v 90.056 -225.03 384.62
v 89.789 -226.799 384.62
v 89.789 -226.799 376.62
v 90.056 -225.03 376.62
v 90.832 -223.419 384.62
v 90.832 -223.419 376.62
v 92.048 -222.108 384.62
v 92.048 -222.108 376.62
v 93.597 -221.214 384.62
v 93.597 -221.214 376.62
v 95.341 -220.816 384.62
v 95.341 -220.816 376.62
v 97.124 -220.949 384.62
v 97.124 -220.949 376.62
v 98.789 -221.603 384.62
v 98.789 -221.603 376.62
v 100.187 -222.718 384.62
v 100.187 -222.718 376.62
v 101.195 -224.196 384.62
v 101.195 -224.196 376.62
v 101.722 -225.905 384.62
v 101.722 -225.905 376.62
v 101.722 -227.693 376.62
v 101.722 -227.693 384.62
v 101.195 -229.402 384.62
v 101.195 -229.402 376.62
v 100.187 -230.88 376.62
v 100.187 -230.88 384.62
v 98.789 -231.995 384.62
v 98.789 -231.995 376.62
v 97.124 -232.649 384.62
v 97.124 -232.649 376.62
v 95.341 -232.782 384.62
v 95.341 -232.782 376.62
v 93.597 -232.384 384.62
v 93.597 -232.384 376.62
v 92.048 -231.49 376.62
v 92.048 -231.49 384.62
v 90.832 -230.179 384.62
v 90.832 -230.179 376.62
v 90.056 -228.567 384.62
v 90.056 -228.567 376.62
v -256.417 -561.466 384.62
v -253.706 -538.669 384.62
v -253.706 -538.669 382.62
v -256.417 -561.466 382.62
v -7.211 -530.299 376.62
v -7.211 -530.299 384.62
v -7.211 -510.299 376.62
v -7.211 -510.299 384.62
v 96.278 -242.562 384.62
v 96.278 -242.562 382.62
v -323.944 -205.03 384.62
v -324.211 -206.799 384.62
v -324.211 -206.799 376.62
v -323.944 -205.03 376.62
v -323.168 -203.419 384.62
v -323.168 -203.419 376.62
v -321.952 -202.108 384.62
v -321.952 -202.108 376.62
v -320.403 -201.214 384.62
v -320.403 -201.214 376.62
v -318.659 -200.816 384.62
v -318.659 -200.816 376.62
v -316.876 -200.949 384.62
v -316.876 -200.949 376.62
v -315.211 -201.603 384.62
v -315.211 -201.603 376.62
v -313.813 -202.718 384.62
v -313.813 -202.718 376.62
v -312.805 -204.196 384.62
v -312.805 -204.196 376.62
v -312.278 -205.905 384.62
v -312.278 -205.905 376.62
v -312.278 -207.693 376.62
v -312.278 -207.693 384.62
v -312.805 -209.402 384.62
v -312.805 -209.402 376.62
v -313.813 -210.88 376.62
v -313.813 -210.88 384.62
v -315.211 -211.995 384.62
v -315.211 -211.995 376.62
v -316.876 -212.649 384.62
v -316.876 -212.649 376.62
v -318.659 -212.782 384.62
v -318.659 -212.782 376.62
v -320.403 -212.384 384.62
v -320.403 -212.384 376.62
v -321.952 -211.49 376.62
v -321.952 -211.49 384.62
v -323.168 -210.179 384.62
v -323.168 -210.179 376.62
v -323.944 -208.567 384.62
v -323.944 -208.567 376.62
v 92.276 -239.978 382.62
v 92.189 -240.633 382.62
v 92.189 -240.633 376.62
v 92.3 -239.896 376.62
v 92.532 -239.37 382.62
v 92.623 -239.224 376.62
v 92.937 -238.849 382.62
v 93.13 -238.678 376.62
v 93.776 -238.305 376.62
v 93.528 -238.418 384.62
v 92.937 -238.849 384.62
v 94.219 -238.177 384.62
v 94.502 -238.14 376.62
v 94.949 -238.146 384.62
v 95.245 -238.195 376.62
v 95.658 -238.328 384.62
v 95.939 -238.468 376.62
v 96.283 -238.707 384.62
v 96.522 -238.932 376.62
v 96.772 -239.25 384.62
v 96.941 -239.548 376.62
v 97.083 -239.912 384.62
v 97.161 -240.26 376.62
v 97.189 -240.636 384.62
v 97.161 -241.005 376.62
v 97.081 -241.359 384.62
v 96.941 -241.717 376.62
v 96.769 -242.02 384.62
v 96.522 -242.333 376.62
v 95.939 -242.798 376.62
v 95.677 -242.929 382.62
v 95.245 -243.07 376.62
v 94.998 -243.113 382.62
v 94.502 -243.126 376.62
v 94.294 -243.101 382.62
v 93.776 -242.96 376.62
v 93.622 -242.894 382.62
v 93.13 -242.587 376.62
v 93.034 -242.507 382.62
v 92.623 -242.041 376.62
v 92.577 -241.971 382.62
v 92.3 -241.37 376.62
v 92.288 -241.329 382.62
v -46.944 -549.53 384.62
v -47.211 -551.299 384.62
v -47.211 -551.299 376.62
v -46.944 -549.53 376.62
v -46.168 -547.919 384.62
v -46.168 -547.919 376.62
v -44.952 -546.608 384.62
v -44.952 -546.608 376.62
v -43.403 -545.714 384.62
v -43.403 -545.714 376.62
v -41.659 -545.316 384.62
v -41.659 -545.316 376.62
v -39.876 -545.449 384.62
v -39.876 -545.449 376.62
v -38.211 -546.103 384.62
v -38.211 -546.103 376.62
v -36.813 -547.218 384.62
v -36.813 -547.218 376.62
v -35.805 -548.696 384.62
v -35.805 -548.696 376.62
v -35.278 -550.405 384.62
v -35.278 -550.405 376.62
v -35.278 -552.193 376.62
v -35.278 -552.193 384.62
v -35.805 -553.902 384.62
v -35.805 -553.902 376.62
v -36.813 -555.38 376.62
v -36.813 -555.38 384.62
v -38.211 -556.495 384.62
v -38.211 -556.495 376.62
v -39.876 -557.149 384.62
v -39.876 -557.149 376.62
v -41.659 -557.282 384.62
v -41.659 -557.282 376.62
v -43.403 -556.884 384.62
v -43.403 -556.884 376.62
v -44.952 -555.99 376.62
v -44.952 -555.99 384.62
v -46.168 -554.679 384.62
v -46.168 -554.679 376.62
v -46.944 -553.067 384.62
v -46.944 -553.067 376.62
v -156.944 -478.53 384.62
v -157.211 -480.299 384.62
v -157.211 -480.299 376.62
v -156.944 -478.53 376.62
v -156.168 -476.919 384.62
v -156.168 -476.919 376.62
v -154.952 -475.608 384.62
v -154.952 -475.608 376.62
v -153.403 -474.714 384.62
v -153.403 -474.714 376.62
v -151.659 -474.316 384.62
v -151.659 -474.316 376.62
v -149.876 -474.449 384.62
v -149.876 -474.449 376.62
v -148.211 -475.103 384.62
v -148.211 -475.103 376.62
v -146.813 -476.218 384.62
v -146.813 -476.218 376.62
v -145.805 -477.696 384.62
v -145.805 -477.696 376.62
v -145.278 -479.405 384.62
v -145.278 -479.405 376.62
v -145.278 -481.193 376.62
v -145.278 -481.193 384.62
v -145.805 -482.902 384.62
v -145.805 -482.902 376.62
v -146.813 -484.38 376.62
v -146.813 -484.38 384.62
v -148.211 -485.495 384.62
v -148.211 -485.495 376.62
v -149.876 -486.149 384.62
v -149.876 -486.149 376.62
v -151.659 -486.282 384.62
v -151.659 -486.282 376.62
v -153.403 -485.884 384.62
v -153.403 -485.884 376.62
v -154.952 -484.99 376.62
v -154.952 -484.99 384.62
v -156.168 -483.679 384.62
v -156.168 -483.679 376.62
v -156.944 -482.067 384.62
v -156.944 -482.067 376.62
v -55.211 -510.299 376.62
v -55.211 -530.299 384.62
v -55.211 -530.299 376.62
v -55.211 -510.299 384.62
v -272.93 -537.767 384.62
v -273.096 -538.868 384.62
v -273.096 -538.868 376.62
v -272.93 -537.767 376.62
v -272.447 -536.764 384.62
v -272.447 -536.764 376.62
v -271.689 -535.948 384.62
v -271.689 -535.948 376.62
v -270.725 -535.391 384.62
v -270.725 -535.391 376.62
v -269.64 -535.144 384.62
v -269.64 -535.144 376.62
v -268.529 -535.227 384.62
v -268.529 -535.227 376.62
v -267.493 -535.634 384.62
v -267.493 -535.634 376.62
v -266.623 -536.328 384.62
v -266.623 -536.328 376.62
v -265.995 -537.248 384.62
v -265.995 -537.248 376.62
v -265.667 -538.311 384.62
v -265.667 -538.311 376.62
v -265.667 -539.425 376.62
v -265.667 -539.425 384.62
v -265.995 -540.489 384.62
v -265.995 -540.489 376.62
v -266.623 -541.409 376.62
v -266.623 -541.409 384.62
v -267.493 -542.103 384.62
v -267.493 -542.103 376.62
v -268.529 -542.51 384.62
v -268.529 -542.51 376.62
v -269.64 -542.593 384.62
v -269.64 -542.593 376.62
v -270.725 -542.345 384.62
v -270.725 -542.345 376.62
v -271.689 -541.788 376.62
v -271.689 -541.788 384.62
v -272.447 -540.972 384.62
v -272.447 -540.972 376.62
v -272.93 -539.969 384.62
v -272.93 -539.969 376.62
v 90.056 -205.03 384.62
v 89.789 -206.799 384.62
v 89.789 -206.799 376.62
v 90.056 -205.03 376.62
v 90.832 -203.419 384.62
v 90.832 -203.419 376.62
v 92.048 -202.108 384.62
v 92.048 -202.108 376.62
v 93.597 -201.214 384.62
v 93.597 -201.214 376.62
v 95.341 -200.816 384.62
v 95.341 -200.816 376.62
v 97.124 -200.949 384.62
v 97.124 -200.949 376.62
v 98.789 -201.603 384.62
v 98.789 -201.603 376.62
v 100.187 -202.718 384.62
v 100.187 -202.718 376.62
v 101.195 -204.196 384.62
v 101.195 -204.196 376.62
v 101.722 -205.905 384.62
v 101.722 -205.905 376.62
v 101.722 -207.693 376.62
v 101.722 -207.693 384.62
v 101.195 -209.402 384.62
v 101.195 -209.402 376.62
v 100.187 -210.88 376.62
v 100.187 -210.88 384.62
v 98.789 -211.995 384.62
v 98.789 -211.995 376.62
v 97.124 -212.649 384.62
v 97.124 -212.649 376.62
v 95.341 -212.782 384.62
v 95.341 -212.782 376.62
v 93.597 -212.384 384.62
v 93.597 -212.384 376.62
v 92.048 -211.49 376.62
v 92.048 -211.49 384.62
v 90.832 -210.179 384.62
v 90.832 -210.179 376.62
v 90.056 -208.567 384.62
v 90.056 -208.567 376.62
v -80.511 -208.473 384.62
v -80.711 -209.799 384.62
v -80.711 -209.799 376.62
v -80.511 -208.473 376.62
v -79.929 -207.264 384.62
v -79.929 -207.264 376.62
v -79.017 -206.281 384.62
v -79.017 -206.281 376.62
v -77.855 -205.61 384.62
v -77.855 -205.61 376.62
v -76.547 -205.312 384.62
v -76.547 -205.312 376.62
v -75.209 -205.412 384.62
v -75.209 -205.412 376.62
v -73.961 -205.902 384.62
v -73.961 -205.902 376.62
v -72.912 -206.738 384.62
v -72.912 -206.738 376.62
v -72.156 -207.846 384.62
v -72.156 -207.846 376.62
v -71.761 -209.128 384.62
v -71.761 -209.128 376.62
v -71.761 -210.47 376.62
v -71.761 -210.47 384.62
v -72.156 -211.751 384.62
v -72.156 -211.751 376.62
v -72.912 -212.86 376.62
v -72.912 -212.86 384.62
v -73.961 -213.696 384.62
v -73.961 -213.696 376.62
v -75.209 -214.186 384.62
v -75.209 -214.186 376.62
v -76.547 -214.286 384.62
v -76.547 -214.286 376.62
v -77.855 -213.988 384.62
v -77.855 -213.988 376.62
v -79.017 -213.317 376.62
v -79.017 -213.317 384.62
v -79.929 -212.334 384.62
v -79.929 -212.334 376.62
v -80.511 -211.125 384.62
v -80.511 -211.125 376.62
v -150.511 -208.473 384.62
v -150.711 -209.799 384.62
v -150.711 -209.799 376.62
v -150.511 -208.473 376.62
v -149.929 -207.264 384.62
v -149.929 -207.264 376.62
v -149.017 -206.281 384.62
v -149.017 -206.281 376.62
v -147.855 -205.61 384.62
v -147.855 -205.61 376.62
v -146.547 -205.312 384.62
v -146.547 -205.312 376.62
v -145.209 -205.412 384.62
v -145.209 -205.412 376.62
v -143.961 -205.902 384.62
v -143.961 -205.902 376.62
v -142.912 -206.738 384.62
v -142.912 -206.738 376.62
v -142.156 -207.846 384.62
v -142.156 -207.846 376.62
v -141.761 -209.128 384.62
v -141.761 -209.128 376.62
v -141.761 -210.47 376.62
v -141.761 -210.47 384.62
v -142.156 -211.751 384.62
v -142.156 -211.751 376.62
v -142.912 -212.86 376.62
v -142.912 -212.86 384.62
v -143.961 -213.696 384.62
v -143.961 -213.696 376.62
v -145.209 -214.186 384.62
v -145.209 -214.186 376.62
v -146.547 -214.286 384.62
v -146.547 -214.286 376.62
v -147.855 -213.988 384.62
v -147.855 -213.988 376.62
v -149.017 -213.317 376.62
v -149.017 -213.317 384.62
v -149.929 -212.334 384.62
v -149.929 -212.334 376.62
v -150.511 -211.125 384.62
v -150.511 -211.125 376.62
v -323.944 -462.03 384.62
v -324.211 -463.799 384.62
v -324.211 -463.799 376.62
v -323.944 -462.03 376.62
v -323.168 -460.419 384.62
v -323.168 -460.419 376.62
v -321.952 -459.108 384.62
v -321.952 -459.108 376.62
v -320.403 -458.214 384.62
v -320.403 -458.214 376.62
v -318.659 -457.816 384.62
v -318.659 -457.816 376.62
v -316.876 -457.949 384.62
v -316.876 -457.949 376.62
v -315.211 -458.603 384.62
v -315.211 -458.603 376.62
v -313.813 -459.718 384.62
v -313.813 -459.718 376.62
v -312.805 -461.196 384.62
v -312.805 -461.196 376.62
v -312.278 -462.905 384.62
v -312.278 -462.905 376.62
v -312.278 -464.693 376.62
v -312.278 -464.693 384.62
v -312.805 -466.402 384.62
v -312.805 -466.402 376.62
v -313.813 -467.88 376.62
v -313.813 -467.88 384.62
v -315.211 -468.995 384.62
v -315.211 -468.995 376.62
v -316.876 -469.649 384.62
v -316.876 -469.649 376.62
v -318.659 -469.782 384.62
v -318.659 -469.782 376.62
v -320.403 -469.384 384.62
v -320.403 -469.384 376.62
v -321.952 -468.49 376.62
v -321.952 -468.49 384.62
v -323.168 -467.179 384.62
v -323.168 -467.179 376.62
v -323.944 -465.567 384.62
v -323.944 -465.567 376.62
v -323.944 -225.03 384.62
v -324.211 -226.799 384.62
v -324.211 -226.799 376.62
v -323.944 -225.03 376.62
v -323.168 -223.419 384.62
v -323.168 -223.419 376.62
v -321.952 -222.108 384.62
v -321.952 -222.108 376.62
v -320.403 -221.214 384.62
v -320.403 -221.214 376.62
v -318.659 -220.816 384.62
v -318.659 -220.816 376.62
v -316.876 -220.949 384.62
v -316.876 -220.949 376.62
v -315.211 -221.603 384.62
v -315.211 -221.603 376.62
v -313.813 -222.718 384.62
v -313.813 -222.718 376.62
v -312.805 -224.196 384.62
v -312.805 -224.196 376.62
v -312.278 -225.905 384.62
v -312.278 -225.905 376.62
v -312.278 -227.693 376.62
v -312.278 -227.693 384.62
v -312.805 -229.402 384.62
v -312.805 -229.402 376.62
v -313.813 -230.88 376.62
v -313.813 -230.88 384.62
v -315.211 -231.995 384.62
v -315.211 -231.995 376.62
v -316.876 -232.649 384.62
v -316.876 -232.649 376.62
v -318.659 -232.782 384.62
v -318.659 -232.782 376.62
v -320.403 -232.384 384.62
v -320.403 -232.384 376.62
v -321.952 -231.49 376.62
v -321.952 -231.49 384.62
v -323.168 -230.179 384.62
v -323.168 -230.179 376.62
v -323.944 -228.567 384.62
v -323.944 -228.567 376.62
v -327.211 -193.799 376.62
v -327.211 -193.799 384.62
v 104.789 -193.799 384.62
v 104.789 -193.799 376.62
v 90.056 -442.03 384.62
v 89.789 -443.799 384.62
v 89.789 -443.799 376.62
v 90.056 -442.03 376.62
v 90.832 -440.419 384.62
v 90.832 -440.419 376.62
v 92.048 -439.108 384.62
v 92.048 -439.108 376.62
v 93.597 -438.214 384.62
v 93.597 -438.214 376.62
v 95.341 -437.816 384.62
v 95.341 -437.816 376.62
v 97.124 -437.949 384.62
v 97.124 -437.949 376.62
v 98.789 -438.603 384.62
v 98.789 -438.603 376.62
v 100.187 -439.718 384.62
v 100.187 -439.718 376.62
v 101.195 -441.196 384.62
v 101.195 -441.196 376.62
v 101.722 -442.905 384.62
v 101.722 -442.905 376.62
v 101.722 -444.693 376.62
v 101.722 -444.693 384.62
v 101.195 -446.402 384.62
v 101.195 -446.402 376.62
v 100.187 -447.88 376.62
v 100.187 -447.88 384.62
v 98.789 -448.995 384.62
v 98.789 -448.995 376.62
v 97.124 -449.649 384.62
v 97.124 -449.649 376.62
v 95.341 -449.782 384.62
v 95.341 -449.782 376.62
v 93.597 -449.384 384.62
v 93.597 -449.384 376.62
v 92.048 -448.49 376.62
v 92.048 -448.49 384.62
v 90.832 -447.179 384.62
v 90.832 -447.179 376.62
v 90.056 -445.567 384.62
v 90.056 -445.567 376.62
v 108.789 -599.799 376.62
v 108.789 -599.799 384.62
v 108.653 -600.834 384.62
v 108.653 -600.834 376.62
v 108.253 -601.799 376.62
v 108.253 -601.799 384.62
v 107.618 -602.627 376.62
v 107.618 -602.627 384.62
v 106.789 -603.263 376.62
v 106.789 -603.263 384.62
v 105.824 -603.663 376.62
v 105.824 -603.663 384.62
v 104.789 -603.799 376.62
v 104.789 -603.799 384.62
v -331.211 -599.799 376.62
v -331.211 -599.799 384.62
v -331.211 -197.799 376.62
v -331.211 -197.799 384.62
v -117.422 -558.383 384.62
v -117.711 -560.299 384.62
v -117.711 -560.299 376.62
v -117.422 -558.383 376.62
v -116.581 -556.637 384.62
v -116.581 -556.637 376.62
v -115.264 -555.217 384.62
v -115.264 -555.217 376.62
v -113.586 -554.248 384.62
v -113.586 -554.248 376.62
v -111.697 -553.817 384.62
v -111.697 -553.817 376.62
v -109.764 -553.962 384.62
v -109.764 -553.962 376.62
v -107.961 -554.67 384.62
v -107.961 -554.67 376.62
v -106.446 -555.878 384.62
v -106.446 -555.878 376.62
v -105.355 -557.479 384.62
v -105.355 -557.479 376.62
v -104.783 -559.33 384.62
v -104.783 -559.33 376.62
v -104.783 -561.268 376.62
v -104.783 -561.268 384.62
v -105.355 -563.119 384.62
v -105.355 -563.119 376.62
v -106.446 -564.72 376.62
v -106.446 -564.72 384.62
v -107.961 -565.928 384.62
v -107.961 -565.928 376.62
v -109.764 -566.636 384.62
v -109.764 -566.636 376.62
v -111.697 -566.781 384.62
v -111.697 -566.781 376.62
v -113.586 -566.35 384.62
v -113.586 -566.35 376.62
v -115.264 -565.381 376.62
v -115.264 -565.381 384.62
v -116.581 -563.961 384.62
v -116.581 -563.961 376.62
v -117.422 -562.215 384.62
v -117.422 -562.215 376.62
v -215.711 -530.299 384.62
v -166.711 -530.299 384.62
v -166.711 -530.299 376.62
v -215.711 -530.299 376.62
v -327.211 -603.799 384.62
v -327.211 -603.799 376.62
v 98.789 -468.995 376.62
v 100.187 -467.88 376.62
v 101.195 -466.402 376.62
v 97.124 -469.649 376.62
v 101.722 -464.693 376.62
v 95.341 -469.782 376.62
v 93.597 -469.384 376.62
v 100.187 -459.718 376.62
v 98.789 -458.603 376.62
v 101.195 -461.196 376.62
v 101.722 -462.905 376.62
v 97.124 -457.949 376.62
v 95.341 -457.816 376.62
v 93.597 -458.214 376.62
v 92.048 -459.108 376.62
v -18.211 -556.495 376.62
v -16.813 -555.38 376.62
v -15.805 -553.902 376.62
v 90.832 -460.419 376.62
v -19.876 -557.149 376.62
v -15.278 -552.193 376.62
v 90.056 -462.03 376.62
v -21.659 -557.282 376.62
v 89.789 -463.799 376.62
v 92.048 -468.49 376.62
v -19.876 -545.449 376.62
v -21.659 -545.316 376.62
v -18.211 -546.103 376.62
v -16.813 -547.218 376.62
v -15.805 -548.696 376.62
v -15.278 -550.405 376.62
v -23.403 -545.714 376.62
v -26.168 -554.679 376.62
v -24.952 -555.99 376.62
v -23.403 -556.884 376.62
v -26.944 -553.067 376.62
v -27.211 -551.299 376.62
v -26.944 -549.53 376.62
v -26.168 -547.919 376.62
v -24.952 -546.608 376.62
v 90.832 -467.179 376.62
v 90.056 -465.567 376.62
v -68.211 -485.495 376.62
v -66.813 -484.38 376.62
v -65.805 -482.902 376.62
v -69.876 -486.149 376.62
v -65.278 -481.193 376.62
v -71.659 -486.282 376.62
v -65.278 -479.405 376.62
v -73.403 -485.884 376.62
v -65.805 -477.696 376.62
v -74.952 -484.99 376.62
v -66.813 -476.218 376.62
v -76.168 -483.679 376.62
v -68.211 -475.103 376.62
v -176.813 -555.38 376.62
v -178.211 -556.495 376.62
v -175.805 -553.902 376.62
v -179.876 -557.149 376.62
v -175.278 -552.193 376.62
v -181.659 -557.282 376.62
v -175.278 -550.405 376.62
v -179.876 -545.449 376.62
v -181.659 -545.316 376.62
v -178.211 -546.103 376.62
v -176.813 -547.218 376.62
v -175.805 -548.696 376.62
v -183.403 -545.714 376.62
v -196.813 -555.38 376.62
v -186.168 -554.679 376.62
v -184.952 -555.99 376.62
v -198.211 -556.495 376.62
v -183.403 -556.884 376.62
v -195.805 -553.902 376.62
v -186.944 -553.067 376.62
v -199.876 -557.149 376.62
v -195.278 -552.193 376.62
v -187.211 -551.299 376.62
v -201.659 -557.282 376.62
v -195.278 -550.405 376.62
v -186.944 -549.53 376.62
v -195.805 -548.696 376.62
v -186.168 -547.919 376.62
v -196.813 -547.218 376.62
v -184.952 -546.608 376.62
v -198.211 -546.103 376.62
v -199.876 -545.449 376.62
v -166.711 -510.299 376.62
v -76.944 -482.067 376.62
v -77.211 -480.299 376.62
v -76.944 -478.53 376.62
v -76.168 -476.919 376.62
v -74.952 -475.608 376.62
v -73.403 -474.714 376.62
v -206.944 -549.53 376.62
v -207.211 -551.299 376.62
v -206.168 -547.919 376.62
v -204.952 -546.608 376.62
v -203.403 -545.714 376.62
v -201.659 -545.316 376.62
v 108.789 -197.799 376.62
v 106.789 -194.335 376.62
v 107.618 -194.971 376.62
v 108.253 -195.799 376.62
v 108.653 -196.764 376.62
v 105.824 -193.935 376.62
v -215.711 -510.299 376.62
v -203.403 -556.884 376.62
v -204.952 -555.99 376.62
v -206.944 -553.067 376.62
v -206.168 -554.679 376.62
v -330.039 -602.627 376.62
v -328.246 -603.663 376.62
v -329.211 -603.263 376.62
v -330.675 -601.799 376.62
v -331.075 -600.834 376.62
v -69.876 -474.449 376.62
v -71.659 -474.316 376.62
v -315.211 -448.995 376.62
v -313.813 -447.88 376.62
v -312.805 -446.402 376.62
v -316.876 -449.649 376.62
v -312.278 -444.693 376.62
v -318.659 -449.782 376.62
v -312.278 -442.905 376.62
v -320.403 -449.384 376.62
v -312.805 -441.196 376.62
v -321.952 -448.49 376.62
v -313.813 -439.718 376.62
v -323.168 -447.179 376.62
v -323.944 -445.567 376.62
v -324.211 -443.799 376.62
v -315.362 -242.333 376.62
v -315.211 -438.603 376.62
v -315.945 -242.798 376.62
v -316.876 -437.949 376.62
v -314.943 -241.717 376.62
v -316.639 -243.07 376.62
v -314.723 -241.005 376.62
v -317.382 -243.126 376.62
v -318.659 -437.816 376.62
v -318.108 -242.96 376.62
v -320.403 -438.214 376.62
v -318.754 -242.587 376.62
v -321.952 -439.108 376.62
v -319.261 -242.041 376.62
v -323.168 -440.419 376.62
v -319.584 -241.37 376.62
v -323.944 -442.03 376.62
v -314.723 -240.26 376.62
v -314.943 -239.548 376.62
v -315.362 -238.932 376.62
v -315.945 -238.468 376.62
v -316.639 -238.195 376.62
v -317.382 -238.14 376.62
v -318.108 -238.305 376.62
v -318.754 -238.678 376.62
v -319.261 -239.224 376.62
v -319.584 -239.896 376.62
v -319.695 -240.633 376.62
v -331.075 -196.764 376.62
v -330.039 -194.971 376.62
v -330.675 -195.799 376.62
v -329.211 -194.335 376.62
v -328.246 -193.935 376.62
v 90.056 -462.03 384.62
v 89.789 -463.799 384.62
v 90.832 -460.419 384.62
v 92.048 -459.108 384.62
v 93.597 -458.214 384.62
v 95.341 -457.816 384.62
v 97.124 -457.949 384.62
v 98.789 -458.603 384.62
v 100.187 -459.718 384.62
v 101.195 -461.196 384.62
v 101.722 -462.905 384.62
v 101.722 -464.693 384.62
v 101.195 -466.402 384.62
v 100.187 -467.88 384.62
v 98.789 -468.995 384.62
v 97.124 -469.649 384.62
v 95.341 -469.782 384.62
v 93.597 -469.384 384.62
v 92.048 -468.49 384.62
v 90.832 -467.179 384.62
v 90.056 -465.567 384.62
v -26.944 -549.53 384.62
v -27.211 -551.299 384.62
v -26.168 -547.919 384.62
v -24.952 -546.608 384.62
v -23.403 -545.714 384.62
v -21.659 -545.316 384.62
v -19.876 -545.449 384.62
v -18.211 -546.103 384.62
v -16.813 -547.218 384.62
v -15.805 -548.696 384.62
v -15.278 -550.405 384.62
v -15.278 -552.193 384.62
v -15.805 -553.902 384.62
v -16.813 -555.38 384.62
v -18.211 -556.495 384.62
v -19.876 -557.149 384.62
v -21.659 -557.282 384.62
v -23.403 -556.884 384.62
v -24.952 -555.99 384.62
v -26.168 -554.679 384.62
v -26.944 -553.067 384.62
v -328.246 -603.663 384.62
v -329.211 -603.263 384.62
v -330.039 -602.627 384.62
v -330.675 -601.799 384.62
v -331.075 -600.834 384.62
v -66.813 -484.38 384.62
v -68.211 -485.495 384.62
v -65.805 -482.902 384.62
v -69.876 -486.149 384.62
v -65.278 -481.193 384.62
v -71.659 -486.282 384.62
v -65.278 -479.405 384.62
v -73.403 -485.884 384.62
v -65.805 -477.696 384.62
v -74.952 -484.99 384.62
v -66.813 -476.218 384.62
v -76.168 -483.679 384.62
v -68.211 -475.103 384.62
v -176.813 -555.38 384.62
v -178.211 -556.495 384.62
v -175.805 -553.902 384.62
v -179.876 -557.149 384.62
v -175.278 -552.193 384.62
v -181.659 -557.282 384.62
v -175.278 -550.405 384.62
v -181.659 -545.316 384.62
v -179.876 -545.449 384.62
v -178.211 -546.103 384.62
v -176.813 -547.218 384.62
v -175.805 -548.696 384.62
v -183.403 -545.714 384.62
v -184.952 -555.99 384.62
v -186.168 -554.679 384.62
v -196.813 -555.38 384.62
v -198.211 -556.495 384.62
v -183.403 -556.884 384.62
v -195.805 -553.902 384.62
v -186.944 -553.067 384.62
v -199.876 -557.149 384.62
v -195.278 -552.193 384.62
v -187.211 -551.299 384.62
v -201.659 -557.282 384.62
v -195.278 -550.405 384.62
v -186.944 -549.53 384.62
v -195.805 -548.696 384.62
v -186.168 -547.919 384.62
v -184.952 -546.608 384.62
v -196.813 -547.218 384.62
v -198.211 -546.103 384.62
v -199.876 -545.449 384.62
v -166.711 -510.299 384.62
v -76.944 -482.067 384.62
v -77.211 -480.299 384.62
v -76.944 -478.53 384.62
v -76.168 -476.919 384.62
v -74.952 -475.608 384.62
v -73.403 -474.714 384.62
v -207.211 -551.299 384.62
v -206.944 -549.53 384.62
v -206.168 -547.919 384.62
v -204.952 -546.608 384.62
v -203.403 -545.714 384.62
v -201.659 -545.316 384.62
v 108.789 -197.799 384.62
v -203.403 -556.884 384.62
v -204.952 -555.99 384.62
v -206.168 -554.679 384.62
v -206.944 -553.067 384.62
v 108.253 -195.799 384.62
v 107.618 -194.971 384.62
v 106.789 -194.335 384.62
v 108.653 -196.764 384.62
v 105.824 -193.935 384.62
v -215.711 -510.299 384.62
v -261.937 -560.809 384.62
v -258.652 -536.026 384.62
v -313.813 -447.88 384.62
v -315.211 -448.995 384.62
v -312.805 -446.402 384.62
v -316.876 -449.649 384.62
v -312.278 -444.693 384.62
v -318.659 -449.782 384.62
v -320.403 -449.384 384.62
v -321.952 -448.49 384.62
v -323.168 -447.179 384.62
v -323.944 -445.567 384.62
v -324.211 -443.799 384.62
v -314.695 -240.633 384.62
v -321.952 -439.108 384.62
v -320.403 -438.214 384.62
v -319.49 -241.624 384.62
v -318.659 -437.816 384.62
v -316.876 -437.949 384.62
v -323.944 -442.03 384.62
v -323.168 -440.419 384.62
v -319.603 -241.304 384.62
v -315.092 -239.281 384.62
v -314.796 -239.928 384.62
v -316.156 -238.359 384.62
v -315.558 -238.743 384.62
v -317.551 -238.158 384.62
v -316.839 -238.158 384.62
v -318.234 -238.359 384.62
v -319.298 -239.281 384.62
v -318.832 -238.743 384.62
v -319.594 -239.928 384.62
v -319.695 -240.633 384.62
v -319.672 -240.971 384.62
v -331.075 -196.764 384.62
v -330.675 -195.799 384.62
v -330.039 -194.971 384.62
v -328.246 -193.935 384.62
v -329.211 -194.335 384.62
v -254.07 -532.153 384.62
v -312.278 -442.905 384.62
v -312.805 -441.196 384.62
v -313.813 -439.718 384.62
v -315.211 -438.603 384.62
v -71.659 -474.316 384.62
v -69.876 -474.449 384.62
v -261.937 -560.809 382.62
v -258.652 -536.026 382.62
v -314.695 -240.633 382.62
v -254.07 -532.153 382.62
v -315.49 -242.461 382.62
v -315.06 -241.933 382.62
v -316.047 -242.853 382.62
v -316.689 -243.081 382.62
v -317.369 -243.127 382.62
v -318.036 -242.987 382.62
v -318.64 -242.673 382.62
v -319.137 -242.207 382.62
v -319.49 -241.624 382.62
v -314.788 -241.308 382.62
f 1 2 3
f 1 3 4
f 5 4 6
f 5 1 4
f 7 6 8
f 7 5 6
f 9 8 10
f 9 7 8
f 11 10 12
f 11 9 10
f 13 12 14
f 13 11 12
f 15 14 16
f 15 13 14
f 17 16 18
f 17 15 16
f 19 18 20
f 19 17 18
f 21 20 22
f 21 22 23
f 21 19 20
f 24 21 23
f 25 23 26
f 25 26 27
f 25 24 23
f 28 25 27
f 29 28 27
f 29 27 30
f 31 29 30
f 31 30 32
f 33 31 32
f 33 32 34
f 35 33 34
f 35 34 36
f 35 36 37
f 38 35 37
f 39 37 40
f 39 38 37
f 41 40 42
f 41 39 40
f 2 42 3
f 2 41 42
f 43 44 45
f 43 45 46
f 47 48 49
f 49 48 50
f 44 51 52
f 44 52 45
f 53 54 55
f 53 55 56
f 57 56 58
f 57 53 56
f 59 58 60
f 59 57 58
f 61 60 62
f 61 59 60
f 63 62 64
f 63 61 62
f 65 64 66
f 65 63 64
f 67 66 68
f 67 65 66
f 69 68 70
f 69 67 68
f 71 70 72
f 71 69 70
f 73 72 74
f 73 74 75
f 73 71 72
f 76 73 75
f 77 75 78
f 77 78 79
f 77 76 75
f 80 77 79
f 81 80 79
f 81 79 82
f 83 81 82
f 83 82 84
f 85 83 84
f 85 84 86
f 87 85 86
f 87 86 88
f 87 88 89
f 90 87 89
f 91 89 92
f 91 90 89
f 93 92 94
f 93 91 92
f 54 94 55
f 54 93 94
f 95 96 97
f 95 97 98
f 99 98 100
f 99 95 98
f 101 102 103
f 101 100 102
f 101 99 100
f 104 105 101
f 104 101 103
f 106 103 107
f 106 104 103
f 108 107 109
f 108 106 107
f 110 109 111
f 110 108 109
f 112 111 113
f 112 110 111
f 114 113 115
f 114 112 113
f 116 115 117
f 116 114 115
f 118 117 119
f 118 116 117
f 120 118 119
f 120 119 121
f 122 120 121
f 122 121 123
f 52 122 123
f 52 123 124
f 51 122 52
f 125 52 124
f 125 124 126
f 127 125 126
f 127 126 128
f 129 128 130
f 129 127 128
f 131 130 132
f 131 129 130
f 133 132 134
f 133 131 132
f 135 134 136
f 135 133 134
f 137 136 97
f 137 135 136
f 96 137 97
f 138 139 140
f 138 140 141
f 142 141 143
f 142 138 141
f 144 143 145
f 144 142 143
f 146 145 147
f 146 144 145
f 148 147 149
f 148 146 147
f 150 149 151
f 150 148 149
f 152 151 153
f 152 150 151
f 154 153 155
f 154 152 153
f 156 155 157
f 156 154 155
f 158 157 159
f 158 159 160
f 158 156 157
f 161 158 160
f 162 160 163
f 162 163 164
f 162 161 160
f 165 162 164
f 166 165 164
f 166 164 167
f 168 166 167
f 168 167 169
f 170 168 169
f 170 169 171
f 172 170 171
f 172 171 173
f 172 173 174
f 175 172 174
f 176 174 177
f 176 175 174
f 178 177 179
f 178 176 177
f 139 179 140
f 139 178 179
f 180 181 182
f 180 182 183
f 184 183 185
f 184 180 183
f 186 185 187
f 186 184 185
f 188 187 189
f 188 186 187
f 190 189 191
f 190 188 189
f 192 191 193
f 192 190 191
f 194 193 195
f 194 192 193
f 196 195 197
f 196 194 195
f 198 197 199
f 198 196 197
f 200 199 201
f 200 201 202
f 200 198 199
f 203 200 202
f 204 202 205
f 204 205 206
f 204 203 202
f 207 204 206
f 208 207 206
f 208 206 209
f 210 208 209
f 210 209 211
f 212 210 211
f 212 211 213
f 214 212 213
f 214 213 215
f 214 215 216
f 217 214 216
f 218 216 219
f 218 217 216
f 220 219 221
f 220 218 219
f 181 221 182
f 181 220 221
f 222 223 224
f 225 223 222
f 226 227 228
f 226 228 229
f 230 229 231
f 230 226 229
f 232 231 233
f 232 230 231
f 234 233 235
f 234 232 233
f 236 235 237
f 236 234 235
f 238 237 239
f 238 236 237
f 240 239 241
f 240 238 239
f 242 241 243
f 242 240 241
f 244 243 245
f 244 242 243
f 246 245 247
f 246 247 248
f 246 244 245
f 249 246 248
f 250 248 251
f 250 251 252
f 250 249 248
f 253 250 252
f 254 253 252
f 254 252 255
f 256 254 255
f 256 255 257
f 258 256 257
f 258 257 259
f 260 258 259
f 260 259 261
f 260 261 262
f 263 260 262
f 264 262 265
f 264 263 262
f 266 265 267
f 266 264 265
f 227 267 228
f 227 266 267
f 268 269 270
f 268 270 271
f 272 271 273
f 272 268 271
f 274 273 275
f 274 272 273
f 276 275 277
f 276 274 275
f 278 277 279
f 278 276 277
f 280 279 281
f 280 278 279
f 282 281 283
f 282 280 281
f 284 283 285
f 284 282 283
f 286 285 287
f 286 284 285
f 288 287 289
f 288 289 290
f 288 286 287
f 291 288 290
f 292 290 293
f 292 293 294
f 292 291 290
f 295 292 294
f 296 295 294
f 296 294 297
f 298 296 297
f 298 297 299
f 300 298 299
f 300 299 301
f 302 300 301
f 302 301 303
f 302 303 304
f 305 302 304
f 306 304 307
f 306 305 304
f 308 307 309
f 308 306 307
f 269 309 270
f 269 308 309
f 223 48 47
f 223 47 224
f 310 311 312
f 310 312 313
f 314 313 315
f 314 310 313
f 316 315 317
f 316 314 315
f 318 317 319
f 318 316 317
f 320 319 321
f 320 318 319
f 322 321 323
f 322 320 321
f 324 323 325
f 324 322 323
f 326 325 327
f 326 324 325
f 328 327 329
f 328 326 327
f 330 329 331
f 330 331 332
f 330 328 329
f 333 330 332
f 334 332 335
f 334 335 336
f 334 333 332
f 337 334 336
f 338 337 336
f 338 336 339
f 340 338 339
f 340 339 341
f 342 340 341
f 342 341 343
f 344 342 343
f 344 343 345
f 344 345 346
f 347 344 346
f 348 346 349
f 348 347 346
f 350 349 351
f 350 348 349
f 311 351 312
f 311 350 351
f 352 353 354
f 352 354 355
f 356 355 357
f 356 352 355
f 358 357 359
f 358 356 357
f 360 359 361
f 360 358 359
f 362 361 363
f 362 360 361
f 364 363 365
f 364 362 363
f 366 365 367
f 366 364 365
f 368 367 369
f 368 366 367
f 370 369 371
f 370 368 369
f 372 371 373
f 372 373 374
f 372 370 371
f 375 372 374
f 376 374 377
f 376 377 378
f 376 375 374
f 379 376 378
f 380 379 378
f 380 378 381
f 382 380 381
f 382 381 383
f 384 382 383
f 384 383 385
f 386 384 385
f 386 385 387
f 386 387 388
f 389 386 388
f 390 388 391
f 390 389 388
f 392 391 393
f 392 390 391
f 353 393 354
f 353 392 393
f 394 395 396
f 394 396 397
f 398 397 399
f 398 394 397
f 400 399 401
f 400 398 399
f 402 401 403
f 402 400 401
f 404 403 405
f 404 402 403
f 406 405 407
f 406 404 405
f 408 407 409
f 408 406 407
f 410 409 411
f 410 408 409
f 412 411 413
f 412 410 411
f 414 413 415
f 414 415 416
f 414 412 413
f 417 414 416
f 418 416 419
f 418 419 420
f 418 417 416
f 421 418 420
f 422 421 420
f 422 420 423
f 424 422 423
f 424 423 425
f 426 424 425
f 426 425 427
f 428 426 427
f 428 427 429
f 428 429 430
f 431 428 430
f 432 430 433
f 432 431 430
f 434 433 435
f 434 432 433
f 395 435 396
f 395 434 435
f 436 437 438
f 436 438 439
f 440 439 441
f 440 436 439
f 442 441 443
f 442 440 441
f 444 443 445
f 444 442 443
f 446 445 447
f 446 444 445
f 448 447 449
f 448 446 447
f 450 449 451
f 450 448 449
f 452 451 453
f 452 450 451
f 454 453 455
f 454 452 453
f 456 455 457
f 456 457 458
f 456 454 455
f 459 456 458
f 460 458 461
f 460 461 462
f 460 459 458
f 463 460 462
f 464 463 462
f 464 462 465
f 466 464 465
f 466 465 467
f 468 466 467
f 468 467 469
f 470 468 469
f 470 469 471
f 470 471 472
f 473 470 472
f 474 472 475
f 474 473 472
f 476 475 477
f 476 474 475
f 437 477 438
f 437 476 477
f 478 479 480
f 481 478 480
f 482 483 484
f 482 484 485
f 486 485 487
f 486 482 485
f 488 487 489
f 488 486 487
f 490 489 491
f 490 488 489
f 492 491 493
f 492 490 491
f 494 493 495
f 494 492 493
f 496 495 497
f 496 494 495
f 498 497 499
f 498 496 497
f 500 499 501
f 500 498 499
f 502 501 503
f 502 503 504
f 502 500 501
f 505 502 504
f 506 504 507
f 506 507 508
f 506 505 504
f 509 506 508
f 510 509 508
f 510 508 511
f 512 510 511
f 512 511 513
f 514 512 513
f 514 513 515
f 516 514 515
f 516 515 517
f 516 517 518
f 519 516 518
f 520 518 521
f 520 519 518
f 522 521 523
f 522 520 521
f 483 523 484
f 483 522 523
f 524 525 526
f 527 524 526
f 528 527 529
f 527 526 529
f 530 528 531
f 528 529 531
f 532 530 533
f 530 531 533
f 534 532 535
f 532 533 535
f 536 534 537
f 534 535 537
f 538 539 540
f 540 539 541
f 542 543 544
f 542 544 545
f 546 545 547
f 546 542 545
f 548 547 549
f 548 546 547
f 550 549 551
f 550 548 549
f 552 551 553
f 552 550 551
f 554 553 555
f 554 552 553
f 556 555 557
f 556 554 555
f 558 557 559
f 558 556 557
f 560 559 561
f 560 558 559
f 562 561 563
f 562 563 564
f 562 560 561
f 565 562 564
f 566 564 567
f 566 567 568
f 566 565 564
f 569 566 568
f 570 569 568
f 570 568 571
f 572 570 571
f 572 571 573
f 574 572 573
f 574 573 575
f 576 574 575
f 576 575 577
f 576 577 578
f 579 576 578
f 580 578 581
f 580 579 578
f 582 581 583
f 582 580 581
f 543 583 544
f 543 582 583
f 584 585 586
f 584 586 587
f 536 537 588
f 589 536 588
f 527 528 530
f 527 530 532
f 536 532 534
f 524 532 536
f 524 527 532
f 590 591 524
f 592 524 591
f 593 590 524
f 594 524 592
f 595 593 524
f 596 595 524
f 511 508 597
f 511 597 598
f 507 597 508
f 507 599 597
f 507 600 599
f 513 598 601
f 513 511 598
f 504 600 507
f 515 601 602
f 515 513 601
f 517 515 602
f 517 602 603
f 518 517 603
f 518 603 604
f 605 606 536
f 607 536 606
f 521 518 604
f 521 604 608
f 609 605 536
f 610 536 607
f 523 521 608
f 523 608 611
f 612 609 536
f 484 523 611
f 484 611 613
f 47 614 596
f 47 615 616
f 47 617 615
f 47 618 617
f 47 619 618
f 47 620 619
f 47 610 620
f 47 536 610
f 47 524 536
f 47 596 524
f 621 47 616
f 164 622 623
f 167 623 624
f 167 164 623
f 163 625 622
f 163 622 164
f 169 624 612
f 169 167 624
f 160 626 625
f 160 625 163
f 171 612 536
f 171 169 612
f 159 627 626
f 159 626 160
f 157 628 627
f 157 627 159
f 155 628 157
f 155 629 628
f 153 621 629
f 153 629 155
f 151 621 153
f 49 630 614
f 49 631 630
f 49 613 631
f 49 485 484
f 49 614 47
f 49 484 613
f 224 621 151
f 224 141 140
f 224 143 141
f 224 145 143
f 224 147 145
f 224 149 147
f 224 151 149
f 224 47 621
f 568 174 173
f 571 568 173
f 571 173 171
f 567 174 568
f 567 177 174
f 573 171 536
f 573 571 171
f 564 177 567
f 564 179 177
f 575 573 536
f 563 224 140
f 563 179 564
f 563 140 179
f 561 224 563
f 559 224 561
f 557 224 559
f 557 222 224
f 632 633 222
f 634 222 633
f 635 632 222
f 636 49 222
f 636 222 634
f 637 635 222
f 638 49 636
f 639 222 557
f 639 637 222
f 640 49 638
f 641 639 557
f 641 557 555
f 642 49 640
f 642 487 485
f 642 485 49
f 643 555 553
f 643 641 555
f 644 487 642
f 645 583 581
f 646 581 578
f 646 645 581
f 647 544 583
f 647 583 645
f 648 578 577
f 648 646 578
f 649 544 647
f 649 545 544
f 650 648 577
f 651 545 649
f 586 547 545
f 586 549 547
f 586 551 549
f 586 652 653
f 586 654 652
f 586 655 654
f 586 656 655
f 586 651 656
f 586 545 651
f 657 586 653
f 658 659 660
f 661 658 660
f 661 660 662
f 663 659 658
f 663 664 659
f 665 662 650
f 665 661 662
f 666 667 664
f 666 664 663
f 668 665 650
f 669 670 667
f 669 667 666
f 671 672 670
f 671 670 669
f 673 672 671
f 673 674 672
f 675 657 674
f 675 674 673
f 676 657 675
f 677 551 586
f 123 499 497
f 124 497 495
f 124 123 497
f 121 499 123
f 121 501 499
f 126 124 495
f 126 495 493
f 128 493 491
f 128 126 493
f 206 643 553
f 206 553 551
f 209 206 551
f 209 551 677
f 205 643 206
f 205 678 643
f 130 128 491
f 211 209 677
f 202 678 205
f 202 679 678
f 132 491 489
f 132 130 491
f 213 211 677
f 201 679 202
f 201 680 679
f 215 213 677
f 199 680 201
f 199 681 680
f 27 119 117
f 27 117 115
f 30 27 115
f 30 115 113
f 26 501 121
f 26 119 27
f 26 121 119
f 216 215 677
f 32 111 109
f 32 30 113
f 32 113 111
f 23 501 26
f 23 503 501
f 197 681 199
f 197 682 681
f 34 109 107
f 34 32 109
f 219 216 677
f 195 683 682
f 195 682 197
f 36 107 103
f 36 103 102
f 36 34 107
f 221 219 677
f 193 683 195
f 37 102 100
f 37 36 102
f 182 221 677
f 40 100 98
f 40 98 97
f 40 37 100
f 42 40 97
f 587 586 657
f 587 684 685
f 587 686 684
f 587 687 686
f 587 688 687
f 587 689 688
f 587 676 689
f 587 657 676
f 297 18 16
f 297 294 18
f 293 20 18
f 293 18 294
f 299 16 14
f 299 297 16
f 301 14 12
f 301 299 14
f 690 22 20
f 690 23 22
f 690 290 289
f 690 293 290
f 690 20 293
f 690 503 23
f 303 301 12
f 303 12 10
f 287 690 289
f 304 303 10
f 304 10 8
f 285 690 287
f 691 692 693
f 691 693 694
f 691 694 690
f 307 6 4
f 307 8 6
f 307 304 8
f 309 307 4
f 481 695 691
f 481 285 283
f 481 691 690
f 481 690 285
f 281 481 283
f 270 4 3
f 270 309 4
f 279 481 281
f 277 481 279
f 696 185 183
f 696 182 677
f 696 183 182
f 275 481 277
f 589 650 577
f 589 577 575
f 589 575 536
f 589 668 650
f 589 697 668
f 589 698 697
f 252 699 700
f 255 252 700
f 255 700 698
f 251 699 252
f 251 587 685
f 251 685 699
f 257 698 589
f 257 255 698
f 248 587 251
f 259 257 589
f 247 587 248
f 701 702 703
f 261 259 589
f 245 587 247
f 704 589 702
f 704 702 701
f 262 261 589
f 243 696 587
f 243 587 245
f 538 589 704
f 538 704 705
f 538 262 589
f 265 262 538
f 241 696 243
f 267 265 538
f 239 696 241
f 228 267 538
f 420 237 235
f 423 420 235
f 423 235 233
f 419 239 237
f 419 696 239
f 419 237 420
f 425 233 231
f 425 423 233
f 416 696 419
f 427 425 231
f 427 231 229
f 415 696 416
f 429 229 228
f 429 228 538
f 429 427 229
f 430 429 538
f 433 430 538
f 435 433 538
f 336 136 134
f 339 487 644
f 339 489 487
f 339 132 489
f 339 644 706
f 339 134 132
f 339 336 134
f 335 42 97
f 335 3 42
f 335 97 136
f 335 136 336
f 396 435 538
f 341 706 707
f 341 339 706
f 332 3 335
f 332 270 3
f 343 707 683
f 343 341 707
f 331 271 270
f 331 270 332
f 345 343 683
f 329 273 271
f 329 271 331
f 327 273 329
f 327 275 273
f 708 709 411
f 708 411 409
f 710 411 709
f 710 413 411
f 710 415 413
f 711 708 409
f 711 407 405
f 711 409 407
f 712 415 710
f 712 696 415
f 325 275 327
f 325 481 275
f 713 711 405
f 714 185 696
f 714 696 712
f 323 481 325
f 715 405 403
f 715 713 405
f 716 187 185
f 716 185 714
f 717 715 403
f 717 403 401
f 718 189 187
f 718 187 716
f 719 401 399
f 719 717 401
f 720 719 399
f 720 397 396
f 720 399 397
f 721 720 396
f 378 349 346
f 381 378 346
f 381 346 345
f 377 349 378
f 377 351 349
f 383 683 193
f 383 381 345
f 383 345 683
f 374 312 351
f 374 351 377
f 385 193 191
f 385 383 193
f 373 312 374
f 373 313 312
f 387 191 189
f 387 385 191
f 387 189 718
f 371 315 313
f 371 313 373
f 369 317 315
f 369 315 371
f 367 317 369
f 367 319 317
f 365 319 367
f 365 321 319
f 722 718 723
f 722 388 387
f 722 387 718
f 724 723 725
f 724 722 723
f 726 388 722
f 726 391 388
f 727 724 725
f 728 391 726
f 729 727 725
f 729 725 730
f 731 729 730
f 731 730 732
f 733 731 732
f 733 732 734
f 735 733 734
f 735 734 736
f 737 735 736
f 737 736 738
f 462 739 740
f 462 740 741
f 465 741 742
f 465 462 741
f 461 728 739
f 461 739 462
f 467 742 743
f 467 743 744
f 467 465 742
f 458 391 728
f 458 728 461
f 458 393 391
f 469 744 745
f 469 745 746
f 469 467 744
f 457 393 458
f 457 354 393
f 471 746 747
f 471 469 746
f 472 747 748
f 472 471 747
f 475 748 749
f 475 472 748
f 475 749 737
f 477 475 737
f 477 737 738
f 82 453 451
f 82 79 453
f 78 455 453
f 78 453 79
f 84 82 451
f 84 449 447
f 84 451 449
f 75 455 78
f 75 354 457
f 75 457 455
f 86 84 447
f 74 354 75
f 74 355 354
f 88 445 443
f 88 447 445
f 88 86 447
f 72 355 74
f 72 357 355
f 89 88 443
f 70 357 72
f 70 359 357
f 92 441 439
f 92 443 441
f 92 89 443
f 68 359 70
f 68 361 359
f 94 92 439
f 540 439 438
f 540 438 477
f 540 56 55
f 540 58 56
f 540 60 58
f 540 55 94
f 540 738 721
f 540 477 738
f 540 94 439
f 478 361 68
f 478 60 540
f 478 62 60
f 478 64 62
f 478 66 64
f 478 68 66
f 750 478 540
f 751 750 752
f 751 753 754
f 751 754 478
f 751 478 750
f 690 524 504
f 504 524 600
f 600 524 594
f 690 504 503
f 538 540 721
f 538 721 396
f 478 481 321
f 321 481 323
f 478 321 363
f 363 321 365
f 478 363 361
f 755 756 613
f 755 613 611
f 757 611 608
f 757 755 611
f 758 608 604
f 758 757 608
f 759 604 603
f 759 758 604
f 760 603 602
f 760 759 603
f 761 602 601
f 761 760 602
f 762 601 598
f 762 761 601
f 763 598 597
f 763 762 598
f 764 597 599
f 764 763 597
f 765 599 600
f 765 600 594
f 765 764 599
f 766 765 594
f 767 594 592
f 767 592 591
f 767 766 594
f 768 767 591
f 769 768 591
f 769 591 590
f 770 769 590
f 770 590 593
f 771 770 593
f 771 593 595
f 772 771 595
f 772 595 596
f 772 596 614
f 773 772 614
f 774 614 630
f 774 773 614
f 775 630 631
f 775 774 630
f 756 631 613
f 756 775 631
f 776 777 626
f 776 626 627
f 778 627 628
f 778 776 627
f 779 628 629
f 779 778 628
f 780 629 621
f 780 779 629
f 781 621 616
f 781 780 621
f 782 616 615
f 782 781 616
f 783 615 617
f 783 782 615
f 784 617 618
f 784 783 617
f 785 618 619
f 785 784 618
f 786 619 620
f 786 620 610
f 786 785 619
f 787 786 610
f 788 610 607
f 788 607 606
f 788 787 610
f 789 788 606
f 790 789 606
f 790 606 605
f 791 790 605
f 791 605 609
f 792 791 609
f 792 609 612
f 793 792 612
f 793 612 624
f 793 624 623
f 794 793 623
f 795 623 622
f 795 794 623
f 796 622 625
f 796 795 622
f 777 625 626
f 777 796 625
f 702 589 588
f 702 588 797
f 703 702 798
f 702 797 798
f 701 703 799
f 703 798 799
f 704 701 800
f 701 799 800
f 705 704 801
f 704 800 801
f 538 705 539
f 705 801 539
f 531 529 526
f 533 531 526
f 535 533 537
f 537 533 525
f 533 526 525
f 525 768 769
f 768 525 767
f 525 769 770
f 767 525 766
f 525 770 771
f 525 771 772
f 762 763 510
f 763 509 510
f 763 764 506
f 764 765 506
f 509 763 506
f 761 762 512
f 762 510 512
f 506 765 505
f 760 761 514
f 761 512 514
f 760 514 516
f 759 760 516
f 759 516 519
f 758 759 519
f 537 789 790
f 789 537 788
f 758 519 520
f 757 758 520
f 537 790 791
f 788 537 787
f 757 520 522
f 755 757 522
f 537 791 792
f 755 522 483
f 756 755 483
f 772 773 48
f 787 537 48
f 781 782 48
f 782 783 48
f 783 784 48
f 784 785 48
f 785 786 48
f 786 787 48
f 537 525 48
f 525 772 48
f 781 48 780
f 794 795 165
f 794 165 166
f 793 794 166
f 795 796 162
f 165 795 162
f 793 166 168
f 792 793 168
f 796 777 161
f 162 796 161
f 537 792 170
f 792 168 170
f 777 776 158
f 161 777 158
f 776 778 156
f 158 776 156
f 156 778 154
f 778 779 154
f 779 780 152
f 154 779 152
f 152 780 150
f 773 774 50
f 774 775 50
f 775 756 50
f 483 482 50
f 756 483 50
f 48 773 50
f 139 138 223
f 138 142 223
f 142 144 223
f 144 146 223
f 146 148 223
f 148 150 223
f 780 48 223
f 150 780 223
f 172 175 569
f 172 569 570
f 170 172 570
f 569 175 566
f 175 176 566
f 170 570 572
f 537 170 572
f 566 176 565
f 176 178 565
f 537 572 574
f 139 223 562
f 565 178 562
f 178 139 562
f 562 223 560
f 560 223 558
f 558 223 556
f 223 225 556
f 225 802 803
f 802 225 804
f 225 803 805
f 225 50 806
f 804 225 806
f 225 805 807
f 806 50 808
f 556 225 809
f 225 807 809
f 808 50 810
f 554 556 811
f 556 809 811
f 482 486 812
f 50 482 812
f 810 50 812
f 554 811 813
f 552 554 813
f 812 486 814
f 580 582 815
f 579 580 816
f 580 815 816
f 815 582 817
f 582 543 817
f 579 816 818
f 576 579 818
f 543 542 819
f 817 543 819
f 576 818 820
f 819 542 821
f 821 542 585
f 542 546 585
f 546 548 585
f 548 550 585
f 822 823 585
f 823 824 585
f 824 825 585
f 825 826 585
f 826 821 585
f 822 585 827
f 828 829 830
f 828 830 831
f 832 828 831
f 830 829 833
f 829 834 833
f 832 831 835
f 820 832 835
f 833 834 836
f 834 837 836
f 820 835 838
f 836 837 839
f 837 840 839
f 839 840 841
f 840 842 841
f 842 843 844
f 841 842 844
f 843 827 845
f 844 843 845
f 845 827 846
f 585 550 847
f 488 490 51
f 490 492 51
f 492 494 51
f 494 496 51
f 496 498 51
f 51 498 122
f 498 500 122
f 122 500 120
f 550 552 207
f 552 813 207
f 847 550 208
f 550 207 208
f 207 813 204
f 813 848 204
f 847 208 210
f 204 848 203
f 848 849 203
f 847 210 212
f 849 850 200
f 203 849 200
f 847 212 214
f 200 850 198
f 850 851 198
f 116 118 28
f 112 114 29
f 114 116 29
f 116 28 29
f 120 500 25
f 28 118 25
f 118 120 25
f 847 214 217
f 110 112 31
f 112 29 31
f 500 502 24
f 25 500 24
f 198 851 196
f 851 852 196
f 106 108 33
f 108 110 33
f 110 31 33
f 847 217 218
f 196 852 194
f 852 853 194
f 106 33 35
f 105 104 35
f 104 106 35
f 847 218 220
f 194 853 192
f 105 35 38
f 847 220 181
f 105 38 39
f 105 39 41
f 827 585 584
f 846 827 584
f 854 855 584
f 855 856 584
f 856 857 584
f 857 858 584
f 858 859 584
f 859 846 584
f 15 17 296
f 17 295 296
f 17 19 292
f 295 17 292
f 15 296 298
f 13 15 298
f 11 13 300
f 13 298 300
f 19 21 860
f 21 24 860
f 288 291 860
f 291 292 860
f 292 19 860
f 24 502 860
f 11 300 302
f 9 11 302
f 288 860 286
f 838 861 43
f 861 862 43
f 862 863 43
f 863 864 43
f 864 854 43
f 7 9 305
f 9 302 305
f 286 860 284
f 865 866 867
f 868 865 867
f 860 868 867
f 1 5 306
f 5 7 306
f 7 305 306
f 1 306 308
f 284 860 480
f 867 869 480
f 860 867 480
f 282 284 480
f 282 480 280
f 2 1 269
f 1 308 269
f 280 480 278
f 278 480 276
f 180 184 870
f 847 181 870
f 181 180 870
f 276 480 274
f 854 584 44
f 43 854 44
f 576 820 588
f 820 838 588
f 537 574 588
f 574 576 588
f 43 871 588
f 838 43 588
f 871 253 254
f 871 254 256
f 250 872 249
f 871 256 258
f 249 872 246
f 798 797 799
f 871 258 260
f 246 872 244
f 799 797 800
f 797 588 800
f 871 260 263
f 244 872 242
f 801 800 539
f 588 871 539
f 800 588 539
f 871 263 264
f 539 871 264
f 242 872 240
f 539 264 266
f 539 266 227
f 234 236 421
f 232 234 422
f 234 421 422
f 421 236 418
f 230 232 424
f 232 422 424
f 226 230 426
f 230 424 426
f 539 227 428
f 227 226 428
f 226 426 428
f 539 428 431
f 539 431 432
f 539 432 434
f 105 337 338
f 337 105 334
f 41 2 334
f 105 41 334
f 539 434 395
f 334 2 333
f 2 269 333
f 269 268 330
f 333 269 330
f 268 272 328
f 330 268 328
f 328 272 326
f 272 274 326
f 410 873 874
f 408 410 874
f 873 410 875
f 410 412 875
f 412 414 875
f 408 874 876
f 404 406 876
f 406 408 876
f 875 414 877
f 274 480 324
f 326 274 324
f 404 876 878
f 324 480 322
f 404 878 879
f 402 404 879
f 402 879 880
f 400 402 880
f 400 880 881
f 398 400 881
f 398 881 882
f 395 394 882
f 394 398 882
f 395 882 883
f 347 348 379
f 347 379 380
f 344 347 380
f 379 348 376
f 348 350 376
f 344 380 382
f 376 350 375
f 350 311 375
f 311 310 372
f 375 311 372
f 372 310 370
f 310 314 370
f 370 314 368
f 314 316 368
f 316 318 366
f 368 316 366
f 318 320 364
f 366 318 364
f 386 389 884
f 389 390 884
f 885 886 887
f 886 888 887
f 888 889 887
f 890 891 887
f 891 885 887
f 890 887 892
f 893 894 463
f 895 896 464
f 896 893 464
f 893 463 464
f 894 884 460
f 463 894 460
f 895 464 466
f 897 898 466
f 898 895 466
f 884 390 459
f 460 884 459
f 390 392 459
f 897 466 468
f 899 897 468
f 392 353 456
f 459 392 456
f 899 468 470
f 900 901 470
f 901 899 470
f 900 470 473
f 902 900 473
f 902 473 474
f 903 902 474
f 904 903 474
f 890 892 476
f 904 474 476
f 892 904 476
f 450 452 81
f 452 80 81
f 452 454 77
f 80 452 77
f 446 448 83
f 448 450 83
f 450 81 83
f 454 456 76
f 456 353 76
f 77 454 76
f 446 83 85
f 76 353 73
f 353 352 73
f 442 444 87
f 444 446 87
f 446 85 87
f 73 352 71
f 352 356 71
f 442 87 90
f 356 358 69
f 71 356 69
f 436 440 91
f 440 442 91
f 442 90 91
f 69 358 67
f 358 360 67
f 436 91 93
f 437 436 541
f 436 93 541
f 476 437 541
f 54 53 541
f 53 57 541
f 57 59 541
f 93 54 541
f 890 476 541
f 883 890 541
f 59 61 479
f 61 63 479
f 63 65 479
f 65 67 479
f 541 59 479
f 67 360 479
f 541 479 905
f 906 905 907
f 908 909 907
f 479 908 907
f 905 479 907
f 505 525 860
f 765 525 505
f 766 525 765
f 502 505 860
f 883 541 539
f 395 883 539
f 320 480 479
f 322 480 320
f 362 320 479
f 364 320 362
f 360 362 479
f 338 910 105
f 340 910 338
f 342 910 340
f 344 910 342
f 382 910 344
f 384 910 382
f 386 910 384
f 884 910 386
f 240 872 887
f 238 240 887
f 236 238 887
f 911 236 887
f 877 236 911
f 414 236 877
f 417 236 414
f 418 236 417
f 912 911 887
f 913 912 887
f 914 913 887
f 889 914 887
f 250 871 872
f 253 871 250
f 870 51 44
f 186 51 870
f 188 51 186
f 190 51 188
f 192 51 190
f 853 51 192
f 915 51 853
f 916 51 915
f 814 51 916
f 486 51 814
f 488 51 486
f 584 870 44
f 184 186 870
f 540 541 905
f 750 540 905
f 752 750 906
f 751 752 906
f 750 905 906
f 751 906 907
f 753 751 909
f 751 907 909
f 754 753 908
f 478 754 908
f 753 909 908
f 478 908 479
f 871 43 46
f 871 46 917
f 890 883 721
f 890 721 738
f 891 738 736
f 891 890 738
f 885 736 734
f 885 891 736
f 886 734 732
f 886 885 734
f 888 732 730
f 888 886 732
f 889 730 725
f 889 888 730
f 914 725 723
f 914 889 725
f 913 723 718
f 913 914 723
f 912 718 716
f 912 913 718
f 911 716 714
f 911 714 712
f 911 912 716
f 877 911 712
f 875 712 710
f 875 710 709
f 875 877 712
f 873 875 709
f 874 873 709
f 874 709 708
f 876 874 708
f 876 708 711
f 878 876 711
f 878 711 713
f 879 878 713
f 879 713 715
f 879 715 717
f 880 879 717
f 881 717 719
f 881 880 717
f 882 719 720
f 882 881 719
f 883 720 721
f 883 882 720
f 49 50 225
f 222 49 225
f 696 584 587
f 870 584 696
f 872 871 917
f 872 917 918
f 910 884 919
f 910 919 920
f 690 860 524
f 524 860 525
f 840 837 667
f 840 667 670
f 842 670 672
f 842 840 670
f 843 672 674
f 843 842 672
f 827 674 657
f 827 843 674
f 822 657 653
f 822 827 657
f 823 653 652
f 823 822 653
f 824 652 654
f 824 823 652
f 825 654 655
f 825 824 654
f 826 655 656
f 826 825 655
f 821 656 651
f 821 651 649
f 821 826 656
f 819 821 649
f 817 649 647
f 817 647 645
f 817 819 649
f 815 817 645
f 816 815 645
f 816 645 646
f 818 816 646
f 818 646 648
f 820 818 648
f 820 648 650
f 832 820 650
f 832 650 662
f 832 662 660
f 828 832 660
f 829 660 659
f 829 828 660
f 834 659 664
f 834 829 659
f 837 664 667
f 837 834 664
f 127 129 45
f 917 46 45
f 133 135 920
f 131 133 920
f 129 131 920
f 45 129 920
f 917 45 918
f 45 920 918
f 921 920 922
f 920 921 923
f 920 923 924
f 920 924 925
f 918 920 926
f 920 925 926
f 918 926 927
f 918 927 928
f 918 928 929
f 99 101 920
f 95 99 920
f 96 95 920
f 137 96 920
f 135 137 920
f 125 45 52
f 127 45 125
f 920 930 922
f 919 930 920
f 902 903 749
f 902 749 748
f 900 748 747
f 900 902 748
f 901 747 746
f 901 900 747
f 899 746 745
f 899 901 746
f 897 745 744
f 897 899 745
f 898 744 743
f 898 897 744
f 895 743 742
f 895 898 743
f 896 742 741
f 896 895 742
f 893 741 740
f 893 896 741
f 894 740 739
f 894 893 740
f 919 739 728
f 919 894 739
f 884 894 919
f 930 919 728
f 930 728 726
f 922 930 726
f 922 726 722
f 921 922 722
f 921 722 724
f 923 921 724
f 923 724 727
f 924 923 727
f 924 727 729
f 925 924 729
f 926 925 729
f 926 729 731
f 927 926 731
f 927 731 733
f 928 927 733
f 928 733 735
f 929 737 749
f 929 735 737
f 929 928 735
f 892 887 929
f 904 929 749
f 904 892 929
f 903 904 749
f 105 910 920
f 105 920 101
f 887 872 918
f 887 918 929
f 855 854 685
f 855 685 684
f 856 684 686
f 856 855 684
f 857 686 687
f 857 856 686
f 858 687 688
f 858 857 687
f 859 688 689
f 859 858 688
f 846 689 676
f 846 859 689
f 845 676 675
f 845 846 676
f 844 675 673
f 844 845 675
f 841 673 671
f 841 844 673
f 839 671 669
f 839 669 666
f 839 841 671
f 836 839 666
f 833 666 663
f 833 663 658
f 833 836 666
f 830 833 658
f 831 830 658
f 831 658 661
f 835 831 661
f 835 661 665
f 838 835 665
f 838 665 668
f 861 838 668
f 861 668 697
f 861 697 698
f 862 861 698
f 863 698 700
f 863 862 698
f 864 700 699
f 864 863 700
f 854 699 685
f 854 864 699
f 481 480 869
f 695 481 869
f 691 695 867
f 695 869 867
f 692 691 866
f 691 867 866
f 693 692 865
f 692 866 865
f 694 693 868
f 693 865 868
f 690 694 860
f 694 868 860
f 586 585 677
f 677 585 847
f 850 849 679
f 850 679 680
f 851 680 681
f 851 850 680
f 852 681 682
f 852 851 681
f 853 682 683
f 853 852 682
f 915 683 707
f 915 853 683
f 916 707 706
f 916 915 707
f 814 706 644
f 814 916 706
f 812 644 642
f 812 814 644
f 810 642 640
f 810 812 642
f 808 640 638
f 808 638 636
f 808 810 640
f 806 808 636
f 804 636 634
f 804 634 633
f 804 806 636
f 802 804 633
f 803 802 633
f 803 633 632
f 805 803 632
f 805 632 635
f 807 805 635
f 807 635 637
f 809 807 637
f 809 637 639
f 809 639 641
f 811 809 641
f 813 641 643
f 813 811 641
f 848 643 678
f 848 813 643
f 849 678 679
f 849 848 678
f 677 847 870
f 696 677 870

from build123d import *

# Parameters (mm, degrees)
SKETCH1_R           = 6
SKETCH1_R_2         = 4.5
SKETCH1_R_3         = 6.5
SKETCH1_R_4         = 3.735
SKETCH1_W           = 48
SKETCH1_H           = 20
SKETCH1_W_2         = 49
BOSS_EXTRUDE1_DEPTH = 8
SKETCH2_R           = 2.5
CUT_EXTRUDE1_DEPTH  = 10
CUT_EXTRUDE2_DEPTH  = 2


with BuildPart() as part:
    # Sketch1 → Boss-Extrude1 (new body)
    with BuildSketch(Plane(origin=(0, 0, 384.620141885), x_dir=(-1, 0, 0), z_dir=(0, 0, -1))):
        with BuildLine():
            Line((-108.789156386, -197.798939869), (-108.789156386, -599.798939869))
            ThreePointArc((-108.789156386, -599.798939869), (-107.617583511, -602.627366994), (-104.789156386, -603.798939869))
            Line((-104.789156386, -603.798939869), (327.210843614, -603.798939869))
            ThreePointArc((327.210843614, -603.798939869), (330.039270738, -602.627366994), (331.210843614, -599.798939869))
            Line((331.210843614, -599.798939869), (331.210843614, -197.798939869))
            ThreePointArc((331.210843614, -197.798939869), (330.039270738, -194.970512745), (327.210843614, -193.798939869))
            Line((327.210843614, -193.798939869), (-104.789156386, -193.798939869))
            ThreePointArc((-104.789156386, -193.798939869), (-107.617583511, -194.970512745), (-108.789156386, -197.798939869))
        make_face()
        with Locations((-95.789156386, -206.798939869)):
            Circle(SKETCH1_R, mode=Mode.SUBTRACT)
        with Locations((-95.789156386, -226.798939869)):
            Circle(SKETCH1_R, mode=Mode.SUBTRACT)
        with Locations((146.210843614, -209.798939869)):
            Circle(SKETCH1_R_2, mode=Mode.SUBTRACT)
        with Locations((76.210843614, -209.798939869)):
            Circle(SKETCH1_R_2, mode=Mode.SUBTRACT)
        with Locations((318.210843614, -206.798939869)):
            Circle(SKETCH1_R, mode=Mode.SUBTRACT)
        with Locations((318.210843614, -226.798939869)):
            Circle(SKETCH1_R, mode=Mode.SUBTRACT)
        with Locations((-95.789156386, -443.798939869)):
            Circle(SKETCH1_R, mode=Mode.SUBTRACT)
        with Locations((-95.789156386, -463.798939869)):
            Circle(SKETCH1_R, mode=Mode.SUBTRACT)
        with Locations((318.210843614, -443.798939869)):
            Circle(SKETCH1_R, mode=Mode.SUBTRACT)
        with Locations((318.210843614, -463.798939869)):
            Circle(SKETCH1_R, mode=Mode.SUBTRACT)
        with Locations((71.210843614, -480.298939869)):
            Circle(SKETCH1_R, mode=Mode.SUBTRACT)
        with Locations((151.210843614, -480.298939869)):
            Circle(SKETCH1_R, mode=Mode.SUBTRACT)
        with Locations((21.210843614, -551.298939869)):
            Circle(SKETCH1_R, mode=Mode.SUBTRACT)
        with Locations((41.210843614, -551.298939869)):
            Circle(SKETCH1_R, mode=Mode.SUBTRACT)
        with Locations((111.210843614, -560.298939869)):
            Circle(SKETCH1_R_3, mode=Mode.SUBTRACT)
        with Locations((181.210843614, -551.298939869)):
            Circle(SKETCH1_R, mode=Mode.SUBTRACT)
        with Locations((269.360529317, -538.868166644)):
            Circle(SKETCH1_R_4, mode=Mode.SUBTRACT)
        with Locations((201.210843614, -551.298939869)):
            Circle(SKETCH1_R, mode=Mode.SUBTRACT)
        with Locations((31.210843614, -520.298939869)):
            Rectangle(SKETCH1_W, SKETCH1_H, mode=Mode.SUBTRACT)
        with Locations((191.210843614, -520.298939869)):
            Rectangle(SKETCH1_W_2, SKETCH1_H, mode=Mode.SUBTRACT)
    extrude(amount=BOSS_EXTRUDE1_DEPTH)

    # Sketch2 → Cut-Extrude1 (cut)
    with BuildSketch(Plane(origin=(0, 0, 384.620141885), x_dir=(-1, 0, 0), z_dir=(0, 0, -1))):
        with Locations((-94.688937296, -240.632664804)):
            Circle(SKETCH2_R)
        with Locations((317.195009352, -240.632664804)):
            Circle(SKETCH2_R)
    extrude(amount=CUT_EXTRUDE1_DEPTH, mode=Mode.SUBTRACT)

    # Sketch3 → Cut-Extrude2 (cut)
    with BuildSketch(Plane.XY.offset(384.620141885)):
        Polygon((92.937374464, -238.848840921), (96.278253898, -242.562450475), (-253.706289527, -538.668659239), (-256.416648587, -561.465752351), (-261.936974764, -560.809437707), (-258.651893581, -536.026212702), (-319.695009352, -240.632664804), (-314.695009352, -240.632664804), (-254.069511981, -532.152999711), align=None)
    extrude(amount=-CUT_EXTRUDE2_DEPTH, mode=Mode.SUBTRACT)


solid = part.part
